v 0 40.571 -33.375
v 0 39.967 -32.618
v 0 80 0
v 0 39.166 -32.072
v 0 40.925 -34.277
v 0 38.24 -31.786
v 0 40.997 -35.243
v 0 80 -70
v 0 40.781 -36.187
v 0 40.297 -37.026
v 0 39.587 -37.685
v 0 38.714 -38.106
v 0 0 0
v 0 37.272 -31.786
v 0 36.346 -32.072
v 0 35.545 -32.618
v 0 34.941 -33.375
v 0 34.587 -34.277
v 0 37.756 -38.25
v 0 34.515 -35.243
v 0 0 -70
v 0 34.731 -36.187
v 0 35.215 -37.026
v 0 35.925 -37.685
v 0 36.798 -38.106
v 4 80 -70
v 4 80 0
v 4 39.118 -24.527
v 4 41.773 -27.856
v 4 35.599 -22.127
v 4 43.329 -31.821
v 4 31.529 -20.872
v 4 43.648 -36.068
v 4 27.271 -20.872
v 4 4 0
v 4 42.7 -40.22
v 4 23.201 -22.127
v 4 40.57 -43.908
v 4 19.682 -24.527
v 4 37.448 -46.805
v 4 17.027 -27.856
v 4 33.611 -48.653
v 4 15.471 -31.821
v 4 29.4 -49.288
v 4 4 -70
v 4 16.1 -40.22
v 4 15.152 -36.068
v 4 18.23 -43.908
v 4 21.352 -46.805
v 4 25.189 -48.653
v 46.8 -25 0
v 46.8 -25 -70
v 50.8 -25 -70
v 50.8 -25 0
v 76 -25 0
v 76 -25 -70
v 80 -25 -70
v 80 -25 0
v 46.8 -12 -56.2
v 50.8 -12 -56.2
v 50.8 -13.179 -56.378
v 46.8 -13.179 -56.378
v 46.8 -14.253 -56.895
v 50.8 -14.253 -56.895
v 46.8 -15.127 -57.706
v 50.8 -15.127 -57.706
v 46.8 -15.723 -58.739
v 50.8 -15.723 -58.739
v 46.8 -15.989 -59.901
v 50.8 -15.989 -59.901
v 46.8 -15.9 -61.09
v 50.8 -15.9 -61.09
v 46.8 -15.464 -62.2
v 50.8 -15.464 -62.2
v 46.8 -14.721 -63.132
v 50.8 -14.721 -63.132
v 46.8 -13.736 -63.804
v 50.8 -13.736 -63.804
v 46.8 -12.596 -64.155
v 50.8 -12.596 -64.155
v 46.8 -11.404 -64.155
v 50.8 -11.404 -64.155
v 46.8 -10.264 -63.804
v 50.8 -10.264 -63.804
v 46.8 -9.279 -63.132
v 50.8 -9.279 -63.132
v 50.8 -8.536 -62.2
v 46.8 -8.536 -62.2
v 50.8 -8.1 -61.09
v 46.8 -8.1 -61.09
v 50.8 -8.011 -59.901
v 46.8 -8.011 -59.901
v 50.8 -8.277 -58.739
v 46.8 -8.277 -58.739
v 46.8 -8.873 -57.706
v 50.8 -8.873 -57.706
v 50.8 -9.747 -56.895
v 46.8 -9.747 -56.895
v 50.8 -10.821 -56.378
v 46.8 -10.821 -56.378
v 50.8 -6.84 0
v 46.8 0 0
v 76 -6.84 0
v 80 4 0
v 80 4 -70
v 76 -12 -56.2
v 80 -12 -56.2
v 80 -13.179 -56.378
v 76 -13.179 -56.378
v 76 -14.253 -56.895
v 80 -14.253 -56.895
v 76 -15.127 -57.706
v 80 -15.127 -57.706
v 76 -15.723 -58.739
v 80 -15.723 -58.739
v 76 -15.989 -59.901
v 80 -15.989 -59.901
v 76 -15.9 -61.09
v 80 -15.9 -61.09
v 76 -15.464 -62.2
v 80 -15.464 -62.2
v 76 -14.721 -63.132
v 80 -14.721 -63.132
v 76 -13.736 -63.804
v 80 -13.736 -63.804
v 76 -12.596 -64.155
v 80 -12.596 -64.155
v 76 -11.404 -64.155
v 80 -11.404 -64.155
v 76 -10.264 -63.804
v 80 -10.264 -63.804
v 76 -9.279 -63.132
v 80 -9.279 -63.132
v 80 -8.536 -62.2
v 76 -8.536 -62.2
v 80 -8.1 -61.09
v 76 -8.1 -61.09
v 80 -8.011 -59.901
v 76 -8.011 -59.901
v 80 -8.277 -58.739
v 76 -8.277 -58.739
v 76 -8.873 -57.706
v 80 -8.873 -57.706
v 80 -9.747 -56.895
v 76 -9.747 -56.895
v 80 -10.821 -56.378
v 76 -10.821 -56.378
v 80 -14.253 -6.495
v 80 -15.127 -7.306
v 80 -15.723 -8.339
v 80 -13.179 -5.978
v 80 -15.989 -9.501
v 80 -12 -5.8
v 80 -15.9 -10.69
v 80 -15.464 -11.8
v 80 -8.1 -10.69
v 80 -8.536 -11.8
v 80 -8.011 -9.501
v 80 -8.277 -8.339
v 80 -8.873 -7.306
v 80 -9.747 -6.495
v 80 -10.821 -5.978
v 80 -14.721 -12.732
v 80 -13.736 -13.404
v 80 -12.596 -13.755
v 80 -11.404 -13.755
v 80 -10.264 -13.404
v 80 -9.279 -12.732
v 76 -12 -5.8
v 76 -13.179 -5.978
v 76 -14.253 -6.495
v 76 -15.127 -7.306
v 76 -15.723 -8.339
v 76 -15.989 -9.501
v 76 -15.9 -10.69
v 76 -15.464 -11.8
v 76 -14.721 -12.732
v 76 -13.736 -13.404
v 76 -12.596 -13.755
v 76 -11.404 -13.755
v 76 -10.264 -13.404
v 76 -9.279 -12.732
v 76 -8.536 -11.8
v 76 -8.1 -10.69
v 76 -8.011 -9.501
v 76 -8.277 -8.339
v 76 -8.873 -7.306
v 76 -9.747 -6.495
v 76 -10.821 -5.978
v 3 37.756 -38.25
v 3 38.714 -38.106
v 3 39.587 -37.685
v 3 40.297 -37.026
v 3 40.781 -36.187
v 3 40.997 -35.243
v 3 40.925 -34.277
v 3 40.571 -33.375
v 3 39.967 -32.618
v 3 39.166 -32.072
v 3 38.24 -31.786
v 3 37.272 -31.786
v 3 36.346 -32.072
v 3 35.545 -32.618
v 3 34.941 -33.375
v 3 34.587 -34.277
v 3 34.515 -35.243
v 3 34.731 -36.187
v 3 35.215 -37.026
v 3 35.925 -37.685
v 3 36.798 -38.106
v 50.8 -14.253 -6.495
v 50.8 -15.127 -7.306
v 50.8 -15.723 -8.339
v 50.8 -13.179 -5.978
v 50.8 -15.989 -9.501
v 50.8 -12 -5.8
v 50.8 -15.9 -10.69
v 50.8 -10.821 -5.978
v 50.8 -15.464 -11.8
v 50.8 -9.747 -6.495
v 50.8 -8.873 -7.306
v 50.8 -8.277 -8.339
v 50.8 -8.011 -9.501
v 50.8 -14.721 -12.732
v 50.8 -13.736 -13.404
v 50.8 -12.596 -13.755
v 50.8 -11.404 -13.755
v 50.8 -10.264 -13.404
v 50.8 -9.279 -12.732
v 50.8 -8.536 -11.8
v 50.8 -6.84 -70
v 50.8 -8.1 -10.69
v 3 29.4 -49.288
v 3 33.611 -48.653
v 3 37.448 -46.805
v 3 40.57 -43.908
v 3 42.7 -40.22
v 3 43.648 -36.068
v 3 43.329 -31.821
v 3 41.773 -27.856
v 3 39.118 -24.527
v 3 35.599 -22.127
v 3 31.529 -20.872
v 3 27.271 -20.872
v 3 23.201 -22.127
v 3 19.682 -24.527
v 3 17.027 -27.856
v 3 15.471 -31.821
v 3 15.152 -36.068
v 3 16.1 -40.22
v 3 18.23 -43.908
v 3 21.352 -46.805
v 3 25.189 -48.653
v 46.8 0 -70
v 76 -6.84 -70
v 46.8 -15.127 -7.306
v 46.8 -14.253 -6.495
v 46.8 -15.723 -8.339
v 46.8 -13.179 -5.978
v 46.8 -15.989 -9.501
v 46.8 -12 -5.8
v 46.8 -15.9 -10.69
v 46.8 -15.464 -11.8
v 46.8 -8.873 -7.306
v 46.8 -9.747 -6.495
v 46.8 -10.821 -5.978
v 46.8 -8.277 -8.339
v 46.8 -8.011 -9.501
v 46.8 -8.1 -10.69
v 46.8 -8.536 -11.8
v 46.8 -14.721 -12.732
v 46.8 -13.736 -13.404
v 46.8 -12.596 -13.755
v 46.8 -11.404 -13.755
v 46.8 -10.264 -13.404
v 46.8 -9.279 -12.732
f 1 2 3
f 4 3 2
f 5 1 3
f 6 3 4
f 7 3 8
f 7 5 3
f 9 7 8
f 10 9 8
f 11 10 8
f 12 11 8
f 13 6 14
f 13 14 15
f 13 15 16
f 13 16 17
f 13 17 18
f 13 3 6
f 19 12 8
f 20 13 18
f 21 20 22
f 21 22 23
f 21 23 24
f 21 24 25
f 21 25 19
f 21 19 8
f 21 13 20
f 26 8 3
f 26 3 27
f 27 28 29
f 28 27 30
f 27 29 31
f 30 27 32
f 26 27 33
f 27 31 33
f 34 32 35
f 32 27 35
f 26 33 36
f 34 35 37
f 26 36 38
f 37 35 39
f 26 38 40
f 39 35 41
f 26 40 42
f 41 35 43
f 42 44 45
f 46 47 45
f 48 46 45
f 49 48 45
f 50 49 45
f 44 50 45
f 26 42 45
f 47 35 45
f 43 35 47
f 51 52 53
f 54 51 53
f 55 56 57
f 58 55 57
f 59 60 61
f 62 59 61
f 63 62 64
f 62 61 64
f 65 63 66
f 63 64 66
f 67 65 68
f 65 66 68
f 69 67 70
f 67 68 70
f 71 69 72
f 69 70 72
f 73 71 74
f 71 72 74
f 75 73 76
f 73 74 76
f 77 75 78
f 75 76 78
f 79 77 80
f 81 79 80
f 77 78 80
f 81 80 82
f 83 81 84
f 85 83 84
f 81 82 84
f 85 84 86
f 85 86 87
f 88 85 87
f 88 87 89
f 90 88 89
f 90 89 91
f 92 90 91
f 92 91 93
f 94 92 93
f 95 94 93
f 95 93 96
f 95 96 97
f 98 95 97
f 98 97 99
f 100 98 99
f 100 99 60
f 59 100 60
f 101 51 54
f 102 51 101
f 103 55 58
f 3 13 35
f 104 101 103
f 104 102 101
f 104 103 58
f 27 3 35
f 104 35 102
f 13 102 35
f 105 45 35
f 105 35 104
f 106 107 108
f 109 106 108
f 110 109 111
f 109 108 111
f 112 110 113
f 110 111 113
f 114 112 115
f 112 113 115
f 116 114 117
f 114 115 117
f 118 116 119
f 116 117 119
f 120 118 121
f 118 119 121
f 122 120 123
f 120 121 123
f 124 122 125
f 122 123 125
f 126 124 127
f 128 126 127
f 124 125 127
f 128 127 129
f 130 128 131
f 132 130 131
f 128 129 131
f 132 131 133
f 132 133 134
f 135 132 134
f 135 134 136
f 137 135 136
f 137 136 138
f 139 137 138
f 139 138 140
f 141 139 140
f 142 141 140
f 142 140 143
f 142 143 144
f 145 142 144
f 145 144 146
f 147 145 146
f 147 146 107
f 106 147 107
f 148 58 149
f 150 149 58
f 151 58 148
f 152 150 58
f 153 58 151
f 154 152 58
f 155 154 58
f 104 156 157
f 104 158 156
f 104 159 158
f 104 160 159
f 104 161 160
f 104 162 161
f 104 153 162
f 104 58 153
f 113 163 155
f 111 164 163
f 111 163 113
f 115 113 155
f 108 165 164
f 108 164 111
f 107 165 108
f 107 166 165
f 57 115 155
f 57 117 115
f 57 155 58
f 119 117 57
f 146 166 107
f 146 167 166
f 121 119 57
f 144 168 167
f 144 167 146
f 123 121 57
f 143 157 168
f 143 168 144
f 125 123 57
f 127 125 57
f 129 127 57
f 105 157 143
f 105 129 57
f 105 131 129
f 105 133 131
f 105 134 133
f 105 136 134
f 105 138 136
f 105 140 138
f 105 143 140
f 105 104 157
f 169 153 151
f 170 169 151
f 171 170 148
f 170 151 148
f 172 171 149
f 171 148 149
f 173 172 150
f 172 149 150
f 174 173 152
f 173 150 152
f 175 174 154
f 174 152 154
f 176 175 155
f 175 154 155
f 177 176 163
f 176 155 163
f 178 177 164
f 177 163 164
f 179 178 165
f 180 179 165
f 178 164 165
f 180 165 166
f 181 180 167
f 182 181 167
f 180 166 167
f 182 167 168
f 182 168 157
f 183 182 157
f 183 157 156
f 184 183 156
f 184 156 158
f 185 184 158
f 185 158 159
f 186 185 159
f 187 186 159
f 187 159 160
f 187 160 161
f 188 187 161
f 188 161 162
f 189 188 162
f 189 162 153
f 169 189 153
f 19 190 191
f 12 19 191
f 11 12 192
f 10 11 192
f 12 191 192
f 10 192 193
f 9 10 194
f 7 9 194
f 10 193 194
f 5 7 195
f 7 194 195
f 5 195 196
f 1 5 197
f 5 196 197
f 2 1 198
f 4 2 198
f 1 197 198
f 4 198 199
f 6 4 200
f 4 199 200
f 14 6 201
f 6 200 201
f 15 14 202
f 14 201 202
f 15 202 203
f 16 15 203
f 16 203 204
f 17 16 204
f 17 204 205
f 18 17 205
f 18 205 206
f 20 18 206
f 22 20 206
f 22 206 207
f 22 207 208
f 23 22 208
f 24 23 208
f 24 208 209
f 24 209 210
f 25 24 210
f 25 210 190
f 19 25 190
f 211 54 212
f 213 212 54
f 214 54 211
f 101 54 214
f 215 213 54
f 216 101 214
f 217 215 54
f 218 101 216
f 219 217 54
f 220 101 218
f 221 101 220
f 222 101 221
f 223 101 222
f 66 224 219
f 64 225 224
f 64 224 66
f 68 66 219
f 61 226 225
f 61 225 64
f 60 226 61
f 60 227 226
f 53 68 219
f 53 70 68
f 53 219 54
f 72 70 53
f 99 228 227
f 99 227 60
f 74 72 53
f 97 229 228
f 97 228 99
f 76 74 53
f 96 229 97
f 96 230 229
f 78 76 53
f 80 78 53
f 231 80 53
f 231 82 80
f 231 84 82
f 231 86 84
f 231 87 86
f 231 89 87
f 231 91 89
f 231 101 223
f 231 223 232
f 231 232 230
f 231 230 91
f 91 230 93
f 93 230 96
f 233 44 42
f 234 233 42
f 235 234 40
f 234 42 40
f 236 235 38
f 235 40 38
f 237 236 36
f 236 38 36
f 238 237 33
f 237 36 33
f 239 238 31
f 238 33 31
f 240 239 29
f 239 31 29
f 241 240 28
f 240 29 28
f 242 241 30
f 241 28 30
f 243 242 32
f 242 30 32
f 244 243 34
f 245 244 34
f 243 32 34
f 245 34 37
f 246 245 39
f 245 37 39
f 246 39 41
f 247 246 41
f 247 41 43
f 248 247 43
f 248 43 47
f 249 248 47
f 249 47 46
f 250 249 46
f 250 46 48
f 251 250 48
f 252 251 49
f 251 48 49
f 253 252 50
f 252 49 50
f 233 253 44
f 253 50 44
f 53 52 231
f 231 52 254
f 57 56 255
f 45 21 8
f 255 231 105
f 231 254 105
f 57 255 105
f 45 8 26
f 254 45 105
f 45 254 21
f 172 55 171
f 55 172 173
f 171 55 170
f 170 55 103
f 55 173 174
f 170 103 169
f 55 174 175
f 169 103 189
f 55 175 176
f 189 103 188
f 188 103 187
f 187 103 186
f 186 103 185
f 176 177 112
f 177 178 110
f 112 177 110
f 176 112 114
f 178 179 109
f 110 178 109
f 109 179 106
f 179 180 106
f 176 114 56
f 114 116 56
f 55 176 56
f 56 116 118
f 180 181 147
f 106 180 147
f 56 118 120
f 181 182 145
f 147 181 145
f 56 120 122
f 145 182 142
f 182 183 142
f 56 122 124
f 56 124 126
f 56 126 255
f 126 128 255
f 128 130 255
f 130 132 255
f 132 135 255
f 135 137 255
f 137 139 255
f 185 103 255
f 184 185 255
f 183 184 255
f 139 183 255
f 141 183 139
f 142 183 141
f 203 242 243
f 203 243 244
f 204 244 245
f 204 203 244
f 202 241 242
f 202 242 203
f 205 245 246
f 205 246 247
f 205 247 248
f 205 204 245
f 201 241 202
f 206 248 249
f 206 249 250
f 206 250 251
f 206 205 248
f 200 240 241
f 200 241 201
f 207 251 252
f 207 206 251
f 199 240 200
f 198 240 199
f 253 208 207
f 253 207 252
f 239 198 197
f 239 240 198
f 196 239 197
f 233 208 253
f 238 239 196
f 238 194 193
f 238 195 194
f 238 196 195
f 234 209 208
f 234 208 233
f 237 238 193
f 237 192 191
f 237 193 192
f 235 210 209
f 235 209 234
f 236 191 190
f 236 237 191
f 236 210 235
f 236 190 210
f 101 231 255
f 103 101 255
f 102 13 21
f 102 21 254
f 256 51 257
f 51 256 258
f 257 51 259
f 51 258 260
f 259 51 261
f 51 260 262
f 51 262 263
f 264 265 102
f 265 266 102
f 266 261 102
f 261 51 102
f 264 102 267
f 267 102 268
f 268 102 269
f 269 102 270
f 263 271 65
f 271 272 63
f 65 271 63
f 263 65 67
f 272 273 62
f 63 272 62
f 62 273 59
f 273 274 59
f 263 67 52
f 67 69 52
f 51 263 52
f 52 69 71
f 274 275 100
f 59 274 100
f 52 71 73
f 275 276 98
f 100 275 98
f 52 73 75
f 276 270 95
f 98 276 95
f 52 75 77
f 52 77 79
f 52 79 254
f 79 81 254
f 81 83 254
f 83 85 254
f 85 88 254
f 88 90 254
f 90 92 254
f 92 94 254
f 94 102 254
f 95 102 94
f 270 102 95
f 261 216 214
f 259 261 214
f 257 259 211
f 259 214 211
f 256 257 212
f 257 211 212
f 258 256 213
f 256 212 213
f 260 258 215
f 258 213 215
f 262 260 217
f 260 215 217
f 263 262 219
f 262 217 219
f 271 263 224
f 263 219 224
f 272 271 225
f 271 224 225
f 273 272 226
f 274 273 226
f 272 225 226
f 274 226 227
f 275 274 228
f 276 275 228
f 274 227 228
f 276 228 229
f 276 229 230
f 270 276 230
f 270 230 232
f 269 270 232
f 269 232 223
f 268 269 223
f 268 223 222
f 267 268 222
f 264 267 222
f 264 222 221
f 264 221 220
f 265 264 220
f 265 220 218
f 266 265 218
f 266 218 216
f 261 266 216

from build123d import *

# Parameters (mm, degrees)
SKETCH1_W           = 80
SKETCH1_H           = 70
BOSS_EXTRUDE1_DEPTH = 4
SKETCH1_3_W         = 4
SKETCH1_3_H         = 70
BOSS_EXTRUDE2_DEPTH = 80
SKETCH1_4_W         = 4
SKETCH1_4_H         = 70
BOSS_EXTRUDE3_DEPTH = 25
SKETCH2_R           = 4
CUT_EXTRUDE1_DEPTH  = 134.041346957
SKETCH3_R           = 3.25
CUT_EXTRUDE2_DEPTH  = 131.675169791
SKETCH3_3_R         = 14.2875
SKETCH3_3_R_2       = 3.25
CUT_EXTRUDE3_DEPTH  = 1
SKETCH1_5_W         = 25.2
SKETCH1_5_H         = 70
BOSS_EXTRUDE4_DEPTH = 6.84


with BuildPart() as part:
    # Sketch1 → Boss-Extrude1 (new body)
    with BuildSketch(Plane(origin=(0, 0, 0), x_dir=(1, 0, 0), z_dir=(0, 1, 0))):
        with Locations((40, 35)):
            Rectangle(SKETCH1_W, SKETCH1_H)
    extrude(amount=BOSS_EXTRUDE1_DEPTH)

    # Sketch1<3> → Boss-Extrude2 (add)
    with BuildSketch(Plane(origin=(0, 0, 0), x_dir=(1, 0, 0), z_dir=(0, 1, 0))):
        with Locations((2, 35)):
            Rectangle(SKETCH1_3_W, SKETCH1_3_H)
    extrude(amount=BOSS_EXTRUDE2_DEPTH)

    # Sketch1<4> → Boss-Extrude3 (add)
    with BuildSketch(Plane(origin=(0, 0, 0), x_dir=(1, 0, 0), z_dir=(0, 1, 0))):
        with Locations((48.8, 35)):
            Rectangle(SKETCH1_4_W, SKETCH1_4_H)
        with Locations((78, 35)):
            Rectangle(SKETCH1_4_W, SKETCH1_4_H)
    extrude(amount=-BOSS_EXTRUDE3_DEPTH)

    # Sketch2 → Cut-Extrude1 (cut, through all)
    with BuildSketch(Plane(origin=(80, 0, 0), x_dir=(0, 0, -1), z_dir=(1, 0, 0))):
        with Locations((60.2, -12)):
            Circle(SKETCH2_R)
        with Locations((9.8, -12)):
            Circle(SKETCH2_R)
    extrude(amount=-CUT_EXTRUDE1_DEPTH, mode=Mode.SUBTRACT)

    # Sketch3 → Cut-Extrude2 (cut, through all)
    with BuildSketch(Plane(origin=(4, 0, 0), x_dir=(0, 0, -1), z_dir=(1, 0, 0))):
        with Locations((35, 37.756)):
            Circle(SKETCH3_R)
    extrude(amount=-CUT_EXTRUDE2_DEPTH, mode=Mode.SUBTRACT)

    # Sketch3<3> → Cut-Extrude3 (cut)
    with BuildSketch(Plane(origin=(4, 0, 0), x_dir=(0, 0, -1), z_dir=(1, 0, 0))):
        with Locations((35, 29.4)):
            Circle(SKETCH3_3_R)
        with Locations((35, 37.756)):
            Circle(SKETCH3_3_R_2, mode=Mode.SUBTRACT)
    extrude(amount=-CUT_EXTRUDE3_DEPTH, mode=Mode.SUBTRACT)

    # Sketch1<5> → Boss-Extrude4 (add)
    with BuildSketch(Plane(origin=(0, 0, 0), x_dir=(1, 0, 0), z_dir=(0, 1, 0))):
        with Locations((63.4, 35)):
            Rectangle(SKETCH1_5_W, SKETCH1_5_H)
    extrude(amount=-BOSS_EXTRUDE4_DEPTH)


solid = part.part
